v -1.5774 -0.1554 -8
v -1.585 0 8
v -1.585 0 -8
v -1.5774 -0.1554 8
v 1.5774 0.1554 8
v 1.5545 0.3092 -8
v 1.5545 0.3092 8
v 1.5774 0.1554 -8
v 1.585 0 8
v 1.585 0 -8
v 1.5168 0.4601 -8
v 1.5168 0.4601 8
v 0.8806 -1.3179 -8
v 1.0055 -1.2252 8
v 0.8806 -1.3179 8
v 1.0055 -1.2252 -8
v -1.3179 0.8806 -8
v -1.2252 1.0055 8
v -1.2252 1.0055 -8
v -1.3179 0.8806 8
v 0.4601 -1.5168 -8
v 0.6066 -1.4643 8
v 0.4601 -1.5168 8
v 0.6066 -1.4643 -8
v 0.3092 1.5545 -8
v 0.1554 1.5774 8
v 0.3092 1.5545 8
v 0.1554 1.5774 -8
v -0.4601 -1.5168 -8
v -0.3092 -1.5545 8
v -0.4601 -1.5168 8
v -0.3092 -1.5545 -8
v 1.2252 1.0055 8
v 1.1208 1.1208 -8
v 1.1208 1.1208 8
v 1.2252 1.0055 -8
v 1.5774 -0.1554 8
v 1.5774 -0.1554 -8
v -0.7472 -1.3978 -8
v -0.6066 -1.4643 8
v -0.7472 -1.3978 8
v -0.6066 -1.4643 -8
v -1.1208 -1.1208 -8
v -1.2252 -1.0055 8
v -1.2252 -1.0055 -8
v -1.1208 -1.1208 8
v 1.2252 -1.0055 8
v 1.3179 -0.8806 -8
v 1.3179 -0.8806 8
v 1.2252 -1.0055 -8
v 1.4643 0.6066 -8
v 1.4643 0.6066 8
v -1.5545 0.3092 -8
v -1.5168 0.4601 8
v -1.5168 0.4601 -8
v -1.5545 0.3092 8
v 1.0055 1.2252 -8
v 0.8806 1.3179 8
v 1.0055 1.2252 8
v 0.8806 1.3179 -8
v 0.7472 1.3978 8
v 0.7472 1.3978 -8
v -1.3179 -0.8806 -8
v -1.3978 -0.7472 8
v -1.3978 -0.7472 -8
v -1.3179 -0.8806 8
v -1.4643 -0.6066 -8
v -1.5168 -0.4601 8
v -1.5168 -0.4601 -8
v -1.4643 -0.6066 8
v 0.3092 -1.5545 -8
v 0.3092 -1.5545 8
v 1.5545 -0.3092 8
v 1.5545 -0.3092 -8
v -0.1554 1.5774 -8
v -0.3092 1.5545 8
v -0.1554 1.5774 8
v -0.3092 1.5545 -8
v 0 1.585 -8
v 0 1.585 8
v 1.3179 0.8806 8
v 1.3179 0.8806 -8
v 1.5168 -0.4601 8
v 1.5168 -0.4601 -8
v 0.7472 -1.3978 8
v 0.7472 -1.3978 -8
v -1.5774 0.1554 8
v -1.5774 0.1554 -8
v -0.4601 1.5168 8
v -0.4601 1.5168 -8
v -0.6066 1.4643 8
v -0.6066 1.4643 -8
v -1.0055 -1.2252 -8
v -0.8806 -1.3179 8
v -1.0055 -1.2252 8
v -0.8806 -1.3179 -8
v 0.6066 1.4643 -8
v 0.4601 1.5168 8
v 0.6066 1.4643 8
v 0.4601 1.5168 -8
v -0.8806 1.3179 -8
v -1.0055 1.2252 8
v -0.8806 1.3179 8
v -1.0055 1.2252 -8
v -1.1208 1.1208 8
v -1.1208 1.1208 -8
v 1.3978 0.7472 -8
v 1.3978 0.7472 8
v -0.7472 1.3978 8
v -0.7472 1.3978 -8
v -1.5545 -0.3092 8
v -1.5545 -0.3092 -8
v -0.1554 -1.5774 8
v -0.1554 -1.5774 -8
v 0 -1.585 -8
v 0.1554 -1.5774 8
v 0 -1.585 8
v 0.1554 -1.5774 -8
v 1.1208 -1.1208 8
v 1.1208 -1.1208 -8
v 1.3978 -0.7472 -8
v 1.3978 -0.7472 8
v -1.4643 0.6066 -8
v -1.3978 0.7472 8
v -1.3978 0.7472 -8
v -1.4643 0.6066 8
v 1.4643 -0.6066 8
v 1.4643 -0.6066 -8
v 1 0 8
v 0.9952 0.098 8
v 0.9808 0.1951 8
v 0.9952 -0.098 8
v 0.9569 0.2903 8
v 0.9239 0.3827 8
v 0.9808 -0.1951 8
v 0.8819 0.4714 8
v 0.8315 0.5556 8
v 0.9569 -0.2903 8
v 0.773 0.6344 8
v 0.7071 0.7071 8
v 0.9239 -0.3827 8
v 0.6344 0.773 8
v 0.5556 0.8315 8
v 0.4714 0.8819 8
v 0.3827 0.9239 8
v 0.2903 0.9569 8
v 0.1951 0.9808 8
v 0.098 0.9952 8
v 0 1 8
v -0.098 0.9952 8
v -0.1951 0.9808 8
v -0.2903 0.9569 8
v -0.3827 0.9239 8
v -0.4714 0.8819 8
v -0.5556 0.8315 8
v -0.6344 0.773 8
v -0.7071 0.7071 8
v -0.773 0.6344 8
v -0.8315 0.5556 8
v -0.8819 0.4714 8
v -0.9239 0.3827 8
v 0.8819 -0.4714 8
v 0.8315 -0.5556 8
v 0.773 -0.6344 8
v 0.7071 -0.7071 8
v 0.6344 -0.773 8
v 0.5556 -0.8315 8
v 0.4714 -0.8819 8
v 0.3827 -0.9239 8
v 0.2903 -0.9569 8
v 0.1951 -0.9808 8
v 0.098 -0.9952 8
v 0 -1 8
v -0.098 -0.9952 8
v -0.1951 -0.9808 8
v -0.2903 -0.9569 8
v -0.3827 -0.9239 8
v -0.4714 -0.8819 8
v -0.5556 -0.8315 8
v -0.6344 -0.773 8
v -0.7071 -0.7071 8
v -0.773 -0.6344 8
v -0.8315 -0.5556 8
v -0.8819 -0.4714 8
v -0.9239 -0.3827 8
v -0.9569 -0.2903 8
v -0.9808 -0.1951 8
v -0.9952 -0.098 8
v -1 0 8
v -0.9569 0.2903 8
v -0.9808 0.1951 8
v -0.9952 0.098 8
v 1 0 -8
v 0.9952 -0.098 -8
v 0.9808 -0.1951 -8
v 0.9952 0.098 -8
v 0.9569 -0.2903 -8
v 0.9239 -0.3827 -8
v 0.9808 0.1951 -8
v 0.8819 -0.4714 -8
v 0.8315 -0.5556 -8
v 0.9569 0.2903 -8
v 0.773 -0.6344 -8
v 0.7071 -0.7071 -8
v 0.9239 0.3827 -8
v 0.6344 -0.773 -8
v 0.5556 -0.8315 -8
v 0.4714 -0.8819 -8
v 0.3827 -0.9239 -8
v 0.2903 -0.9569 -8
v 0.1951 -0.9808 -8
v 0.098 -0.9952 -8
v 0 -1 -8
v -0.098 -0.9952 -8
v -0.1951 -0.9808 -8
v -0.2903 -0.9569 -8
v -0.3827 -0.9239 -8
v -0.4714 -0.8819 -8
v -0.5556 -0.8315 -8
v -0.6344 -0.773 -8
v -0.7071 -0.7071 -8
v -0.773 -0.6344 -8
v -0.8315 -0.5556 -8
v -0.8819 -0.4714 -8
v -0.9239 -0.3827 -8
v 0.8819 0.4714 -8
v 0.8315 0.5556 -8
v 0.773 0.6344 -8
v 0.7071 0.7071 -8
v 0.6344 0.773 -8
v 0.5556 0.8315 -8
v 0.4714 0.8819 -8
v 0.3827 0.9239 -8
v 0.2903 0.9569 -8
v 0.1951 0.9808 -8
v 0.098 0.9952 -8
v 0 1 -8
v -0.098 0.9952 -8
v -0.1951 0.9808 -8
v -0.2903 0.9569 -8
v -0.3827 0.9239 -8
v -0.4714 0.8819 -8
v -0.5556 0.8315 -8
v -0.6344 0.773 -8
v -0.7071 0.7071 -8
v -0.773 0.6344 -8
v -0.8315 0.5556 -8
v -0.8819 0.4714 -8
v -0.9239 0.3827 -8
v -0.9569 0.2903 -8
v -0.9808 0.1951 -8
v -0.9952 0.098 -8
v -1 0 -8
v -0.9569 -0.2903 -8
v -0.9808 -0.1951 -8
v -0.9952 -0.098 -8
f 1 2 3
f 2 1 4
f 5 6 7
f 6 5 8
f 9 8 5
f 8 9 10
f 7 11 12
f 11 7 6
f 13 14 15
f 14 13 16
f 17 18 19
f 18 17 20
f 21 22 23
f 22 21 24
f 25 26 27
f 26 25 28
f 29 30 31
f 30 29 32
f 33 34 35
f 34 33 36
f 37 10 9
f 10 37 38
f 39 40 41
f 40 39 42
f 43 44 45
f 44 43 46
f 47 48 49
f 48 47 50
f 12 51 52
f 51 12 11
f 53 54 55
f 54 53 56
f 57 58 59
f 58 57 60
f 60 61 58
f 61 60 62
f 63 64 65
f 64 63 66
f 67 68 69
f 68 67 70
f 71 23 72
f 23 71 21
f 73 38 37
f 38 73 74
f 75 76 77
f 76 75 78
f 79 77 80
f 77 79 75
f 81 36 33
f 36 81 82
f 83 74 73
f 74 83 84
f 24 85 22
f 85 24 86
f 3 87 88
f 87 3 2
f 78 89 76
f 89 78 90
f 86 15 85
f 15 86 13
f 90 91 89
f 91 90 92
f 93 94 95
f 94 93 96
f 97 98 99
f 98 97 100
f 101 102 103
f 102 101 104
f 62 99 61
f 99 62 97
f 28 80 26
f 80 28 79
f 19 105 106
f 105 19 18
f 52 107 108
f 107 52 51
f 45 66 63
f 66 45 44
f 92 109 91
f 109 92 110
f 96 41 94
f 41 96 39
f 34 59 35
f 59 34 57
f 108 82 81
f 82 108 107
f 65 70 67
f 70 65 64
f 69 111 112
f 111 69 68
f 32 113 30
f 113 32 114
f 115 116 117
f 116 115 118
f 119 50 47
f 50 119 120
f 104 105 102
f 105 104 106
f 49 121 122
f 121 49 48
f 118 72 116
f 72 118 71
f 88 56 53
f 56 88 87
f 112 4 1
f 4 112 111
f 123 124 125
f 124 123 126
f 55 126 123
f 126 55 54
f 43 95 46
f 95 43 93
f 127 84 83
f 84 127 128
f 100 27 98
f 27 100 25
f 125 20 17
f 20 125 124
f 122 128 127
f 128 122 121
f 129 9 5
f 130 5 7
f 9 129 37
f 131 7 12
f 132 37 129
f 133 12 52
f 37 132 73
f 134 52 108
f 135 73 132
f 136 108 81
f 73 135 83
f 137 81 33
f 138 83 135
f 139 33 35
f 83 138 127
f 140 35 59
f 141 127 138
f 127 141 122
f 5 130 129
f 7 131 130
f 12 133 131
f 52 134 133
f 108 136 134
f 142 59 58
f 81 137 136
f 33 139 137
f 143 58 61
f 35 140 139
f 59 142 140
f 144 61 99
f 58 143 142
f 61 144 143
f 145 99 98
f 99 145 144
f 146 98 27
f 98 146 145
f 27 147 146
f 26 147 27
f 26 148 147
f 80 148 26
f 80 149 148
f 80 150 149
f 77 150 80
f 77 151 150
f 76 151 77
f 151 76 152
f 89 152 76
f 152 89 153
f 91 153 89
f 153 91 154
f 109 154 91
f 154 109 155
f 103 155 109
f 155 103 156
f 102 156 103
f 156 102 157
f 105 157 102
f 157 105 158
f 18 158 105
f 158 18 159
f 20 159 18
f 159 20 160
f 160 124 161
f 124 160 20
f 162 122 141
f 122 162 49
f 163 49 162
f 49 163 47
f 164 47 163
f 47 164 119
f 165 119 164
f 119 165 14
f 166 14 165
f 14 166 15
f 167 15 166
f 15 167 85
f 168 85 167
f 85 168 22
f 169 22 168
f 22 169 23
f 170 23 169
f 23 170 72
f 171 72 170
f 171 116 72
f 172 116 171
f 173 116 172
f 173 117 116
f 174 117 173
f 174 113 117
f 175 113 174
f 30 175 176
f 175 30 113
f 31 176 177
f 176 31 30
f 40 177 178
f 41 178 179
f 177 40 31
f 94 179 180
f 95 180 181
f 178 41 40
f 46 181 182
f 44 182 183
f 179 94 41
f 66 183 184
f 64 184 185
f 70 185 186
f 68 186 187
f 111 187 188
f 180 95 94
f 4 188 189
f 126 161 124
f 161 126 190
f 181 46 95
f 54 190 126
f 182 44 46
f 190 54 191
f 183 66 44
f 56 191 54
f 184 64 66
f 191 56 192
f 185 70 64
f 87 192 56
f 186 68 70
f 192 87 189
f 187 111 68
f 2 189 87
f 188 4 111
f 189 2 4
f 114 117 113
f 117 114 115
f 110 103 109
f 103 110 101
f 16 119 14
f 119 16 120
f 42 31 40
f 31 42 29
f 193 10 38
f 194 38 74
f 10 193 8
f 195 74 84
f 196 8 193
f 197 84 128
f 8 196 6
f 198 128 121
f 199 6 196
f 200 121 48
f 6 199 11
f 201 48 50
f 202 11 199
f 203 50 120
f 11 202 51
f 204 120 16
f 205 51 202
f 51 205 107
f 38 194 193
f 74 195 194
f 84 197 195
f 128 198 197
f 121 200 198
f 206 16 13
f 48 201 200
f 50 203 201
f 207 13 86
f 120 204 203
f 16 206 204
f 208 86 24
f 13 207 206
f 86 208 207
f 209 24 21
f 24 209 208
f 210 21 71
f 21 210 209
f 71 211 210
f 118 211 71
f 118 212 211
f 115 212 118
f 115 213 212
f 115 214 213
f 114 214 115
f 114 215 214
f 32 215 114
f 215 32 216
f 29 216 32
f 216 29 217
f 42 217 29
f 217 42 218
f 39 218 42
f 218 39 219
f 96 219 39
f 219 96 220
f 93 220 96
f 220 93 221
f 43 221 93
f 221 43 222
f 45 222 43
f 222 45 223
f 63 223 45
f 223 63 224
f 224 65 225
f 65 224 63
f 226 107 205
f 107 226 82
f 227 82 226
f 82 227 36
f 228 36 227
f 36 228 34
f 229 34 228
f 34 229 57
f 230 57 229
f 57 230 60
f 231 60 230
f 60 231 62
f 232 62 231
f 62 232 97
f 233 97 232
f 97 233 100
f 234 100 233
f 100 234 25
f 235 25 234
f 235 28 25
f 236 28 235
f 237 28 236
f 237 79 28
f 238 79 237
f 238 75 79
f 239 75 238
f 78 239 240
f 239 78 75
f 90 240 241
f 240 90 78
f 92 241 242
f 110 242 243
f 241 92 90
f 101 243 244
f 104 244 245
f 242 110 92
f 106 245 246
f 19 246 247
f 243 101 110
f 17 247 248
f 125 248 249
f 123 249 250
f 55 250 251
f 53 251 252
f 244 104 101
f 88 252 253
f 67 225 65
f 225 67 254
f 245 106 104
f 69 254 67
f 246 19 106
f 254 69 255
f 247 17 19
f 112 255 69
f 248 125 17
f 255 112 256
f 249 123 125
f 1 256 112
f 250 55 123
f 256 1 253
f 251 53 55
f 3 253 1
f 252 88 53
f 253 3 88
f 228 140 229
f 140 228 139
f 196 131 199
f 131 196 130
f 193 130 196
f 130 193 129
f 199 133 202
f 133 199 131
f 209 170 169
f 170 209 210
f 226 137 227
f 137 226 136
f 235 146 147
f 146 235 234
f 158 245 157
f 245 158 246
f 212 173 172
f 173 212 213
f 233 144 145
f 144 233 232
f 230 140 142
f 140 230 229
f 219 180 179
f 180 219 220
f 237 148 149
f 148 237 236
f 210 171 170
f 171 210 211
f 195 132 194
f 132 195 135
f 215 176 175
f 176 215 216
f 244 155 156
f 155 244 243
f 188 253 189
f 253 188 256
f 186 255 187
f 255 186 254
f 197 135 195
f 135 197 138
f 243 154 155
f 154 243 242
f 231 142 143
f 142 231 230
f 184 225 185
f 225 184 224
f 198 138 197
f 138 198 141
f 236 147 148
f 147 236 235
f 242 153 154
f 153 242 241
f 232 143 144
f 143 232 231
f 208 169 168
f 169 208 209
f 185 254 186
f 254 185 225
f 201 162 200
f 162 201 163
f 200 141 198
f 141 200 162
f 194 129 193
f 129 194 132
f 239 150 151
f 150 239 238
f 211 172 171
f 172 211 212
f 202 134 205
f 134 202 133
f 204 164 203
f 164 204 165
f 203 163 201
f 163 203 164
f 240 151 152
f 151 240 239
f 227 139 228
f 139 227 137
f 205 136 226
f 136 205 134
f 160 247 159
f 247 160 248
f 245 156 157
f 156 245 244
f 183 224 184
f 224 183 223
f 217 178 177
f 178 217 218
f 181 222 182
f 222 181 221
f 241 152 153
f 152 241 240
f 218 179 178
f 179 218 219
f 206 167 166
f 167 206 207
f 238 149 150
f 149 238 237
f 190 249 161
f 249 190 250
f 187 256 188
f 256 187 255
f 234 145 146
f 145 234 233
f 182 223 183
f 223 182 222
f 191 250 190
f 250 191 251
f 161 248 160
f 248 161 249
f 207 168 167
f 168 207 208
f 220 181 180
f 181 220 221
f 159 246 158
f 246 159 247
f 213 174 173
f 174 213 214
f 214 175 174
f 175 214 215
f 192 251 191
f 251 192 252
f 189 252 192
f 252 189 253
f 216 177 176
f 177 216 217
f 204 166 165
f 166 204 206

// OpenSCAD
$fn=64;

module standoff_pillar(thread_d=2.0, length=16.0, outer_d=3.17) {
    difference() {
        cylinder(h=length, d=outer_d, center=true);
        cylinder(h=length+0.4, d=thread_d, center=true);
    }
}

standoff_pillar(thread_d=2.0, length=16.0, outer_d=3.17);
